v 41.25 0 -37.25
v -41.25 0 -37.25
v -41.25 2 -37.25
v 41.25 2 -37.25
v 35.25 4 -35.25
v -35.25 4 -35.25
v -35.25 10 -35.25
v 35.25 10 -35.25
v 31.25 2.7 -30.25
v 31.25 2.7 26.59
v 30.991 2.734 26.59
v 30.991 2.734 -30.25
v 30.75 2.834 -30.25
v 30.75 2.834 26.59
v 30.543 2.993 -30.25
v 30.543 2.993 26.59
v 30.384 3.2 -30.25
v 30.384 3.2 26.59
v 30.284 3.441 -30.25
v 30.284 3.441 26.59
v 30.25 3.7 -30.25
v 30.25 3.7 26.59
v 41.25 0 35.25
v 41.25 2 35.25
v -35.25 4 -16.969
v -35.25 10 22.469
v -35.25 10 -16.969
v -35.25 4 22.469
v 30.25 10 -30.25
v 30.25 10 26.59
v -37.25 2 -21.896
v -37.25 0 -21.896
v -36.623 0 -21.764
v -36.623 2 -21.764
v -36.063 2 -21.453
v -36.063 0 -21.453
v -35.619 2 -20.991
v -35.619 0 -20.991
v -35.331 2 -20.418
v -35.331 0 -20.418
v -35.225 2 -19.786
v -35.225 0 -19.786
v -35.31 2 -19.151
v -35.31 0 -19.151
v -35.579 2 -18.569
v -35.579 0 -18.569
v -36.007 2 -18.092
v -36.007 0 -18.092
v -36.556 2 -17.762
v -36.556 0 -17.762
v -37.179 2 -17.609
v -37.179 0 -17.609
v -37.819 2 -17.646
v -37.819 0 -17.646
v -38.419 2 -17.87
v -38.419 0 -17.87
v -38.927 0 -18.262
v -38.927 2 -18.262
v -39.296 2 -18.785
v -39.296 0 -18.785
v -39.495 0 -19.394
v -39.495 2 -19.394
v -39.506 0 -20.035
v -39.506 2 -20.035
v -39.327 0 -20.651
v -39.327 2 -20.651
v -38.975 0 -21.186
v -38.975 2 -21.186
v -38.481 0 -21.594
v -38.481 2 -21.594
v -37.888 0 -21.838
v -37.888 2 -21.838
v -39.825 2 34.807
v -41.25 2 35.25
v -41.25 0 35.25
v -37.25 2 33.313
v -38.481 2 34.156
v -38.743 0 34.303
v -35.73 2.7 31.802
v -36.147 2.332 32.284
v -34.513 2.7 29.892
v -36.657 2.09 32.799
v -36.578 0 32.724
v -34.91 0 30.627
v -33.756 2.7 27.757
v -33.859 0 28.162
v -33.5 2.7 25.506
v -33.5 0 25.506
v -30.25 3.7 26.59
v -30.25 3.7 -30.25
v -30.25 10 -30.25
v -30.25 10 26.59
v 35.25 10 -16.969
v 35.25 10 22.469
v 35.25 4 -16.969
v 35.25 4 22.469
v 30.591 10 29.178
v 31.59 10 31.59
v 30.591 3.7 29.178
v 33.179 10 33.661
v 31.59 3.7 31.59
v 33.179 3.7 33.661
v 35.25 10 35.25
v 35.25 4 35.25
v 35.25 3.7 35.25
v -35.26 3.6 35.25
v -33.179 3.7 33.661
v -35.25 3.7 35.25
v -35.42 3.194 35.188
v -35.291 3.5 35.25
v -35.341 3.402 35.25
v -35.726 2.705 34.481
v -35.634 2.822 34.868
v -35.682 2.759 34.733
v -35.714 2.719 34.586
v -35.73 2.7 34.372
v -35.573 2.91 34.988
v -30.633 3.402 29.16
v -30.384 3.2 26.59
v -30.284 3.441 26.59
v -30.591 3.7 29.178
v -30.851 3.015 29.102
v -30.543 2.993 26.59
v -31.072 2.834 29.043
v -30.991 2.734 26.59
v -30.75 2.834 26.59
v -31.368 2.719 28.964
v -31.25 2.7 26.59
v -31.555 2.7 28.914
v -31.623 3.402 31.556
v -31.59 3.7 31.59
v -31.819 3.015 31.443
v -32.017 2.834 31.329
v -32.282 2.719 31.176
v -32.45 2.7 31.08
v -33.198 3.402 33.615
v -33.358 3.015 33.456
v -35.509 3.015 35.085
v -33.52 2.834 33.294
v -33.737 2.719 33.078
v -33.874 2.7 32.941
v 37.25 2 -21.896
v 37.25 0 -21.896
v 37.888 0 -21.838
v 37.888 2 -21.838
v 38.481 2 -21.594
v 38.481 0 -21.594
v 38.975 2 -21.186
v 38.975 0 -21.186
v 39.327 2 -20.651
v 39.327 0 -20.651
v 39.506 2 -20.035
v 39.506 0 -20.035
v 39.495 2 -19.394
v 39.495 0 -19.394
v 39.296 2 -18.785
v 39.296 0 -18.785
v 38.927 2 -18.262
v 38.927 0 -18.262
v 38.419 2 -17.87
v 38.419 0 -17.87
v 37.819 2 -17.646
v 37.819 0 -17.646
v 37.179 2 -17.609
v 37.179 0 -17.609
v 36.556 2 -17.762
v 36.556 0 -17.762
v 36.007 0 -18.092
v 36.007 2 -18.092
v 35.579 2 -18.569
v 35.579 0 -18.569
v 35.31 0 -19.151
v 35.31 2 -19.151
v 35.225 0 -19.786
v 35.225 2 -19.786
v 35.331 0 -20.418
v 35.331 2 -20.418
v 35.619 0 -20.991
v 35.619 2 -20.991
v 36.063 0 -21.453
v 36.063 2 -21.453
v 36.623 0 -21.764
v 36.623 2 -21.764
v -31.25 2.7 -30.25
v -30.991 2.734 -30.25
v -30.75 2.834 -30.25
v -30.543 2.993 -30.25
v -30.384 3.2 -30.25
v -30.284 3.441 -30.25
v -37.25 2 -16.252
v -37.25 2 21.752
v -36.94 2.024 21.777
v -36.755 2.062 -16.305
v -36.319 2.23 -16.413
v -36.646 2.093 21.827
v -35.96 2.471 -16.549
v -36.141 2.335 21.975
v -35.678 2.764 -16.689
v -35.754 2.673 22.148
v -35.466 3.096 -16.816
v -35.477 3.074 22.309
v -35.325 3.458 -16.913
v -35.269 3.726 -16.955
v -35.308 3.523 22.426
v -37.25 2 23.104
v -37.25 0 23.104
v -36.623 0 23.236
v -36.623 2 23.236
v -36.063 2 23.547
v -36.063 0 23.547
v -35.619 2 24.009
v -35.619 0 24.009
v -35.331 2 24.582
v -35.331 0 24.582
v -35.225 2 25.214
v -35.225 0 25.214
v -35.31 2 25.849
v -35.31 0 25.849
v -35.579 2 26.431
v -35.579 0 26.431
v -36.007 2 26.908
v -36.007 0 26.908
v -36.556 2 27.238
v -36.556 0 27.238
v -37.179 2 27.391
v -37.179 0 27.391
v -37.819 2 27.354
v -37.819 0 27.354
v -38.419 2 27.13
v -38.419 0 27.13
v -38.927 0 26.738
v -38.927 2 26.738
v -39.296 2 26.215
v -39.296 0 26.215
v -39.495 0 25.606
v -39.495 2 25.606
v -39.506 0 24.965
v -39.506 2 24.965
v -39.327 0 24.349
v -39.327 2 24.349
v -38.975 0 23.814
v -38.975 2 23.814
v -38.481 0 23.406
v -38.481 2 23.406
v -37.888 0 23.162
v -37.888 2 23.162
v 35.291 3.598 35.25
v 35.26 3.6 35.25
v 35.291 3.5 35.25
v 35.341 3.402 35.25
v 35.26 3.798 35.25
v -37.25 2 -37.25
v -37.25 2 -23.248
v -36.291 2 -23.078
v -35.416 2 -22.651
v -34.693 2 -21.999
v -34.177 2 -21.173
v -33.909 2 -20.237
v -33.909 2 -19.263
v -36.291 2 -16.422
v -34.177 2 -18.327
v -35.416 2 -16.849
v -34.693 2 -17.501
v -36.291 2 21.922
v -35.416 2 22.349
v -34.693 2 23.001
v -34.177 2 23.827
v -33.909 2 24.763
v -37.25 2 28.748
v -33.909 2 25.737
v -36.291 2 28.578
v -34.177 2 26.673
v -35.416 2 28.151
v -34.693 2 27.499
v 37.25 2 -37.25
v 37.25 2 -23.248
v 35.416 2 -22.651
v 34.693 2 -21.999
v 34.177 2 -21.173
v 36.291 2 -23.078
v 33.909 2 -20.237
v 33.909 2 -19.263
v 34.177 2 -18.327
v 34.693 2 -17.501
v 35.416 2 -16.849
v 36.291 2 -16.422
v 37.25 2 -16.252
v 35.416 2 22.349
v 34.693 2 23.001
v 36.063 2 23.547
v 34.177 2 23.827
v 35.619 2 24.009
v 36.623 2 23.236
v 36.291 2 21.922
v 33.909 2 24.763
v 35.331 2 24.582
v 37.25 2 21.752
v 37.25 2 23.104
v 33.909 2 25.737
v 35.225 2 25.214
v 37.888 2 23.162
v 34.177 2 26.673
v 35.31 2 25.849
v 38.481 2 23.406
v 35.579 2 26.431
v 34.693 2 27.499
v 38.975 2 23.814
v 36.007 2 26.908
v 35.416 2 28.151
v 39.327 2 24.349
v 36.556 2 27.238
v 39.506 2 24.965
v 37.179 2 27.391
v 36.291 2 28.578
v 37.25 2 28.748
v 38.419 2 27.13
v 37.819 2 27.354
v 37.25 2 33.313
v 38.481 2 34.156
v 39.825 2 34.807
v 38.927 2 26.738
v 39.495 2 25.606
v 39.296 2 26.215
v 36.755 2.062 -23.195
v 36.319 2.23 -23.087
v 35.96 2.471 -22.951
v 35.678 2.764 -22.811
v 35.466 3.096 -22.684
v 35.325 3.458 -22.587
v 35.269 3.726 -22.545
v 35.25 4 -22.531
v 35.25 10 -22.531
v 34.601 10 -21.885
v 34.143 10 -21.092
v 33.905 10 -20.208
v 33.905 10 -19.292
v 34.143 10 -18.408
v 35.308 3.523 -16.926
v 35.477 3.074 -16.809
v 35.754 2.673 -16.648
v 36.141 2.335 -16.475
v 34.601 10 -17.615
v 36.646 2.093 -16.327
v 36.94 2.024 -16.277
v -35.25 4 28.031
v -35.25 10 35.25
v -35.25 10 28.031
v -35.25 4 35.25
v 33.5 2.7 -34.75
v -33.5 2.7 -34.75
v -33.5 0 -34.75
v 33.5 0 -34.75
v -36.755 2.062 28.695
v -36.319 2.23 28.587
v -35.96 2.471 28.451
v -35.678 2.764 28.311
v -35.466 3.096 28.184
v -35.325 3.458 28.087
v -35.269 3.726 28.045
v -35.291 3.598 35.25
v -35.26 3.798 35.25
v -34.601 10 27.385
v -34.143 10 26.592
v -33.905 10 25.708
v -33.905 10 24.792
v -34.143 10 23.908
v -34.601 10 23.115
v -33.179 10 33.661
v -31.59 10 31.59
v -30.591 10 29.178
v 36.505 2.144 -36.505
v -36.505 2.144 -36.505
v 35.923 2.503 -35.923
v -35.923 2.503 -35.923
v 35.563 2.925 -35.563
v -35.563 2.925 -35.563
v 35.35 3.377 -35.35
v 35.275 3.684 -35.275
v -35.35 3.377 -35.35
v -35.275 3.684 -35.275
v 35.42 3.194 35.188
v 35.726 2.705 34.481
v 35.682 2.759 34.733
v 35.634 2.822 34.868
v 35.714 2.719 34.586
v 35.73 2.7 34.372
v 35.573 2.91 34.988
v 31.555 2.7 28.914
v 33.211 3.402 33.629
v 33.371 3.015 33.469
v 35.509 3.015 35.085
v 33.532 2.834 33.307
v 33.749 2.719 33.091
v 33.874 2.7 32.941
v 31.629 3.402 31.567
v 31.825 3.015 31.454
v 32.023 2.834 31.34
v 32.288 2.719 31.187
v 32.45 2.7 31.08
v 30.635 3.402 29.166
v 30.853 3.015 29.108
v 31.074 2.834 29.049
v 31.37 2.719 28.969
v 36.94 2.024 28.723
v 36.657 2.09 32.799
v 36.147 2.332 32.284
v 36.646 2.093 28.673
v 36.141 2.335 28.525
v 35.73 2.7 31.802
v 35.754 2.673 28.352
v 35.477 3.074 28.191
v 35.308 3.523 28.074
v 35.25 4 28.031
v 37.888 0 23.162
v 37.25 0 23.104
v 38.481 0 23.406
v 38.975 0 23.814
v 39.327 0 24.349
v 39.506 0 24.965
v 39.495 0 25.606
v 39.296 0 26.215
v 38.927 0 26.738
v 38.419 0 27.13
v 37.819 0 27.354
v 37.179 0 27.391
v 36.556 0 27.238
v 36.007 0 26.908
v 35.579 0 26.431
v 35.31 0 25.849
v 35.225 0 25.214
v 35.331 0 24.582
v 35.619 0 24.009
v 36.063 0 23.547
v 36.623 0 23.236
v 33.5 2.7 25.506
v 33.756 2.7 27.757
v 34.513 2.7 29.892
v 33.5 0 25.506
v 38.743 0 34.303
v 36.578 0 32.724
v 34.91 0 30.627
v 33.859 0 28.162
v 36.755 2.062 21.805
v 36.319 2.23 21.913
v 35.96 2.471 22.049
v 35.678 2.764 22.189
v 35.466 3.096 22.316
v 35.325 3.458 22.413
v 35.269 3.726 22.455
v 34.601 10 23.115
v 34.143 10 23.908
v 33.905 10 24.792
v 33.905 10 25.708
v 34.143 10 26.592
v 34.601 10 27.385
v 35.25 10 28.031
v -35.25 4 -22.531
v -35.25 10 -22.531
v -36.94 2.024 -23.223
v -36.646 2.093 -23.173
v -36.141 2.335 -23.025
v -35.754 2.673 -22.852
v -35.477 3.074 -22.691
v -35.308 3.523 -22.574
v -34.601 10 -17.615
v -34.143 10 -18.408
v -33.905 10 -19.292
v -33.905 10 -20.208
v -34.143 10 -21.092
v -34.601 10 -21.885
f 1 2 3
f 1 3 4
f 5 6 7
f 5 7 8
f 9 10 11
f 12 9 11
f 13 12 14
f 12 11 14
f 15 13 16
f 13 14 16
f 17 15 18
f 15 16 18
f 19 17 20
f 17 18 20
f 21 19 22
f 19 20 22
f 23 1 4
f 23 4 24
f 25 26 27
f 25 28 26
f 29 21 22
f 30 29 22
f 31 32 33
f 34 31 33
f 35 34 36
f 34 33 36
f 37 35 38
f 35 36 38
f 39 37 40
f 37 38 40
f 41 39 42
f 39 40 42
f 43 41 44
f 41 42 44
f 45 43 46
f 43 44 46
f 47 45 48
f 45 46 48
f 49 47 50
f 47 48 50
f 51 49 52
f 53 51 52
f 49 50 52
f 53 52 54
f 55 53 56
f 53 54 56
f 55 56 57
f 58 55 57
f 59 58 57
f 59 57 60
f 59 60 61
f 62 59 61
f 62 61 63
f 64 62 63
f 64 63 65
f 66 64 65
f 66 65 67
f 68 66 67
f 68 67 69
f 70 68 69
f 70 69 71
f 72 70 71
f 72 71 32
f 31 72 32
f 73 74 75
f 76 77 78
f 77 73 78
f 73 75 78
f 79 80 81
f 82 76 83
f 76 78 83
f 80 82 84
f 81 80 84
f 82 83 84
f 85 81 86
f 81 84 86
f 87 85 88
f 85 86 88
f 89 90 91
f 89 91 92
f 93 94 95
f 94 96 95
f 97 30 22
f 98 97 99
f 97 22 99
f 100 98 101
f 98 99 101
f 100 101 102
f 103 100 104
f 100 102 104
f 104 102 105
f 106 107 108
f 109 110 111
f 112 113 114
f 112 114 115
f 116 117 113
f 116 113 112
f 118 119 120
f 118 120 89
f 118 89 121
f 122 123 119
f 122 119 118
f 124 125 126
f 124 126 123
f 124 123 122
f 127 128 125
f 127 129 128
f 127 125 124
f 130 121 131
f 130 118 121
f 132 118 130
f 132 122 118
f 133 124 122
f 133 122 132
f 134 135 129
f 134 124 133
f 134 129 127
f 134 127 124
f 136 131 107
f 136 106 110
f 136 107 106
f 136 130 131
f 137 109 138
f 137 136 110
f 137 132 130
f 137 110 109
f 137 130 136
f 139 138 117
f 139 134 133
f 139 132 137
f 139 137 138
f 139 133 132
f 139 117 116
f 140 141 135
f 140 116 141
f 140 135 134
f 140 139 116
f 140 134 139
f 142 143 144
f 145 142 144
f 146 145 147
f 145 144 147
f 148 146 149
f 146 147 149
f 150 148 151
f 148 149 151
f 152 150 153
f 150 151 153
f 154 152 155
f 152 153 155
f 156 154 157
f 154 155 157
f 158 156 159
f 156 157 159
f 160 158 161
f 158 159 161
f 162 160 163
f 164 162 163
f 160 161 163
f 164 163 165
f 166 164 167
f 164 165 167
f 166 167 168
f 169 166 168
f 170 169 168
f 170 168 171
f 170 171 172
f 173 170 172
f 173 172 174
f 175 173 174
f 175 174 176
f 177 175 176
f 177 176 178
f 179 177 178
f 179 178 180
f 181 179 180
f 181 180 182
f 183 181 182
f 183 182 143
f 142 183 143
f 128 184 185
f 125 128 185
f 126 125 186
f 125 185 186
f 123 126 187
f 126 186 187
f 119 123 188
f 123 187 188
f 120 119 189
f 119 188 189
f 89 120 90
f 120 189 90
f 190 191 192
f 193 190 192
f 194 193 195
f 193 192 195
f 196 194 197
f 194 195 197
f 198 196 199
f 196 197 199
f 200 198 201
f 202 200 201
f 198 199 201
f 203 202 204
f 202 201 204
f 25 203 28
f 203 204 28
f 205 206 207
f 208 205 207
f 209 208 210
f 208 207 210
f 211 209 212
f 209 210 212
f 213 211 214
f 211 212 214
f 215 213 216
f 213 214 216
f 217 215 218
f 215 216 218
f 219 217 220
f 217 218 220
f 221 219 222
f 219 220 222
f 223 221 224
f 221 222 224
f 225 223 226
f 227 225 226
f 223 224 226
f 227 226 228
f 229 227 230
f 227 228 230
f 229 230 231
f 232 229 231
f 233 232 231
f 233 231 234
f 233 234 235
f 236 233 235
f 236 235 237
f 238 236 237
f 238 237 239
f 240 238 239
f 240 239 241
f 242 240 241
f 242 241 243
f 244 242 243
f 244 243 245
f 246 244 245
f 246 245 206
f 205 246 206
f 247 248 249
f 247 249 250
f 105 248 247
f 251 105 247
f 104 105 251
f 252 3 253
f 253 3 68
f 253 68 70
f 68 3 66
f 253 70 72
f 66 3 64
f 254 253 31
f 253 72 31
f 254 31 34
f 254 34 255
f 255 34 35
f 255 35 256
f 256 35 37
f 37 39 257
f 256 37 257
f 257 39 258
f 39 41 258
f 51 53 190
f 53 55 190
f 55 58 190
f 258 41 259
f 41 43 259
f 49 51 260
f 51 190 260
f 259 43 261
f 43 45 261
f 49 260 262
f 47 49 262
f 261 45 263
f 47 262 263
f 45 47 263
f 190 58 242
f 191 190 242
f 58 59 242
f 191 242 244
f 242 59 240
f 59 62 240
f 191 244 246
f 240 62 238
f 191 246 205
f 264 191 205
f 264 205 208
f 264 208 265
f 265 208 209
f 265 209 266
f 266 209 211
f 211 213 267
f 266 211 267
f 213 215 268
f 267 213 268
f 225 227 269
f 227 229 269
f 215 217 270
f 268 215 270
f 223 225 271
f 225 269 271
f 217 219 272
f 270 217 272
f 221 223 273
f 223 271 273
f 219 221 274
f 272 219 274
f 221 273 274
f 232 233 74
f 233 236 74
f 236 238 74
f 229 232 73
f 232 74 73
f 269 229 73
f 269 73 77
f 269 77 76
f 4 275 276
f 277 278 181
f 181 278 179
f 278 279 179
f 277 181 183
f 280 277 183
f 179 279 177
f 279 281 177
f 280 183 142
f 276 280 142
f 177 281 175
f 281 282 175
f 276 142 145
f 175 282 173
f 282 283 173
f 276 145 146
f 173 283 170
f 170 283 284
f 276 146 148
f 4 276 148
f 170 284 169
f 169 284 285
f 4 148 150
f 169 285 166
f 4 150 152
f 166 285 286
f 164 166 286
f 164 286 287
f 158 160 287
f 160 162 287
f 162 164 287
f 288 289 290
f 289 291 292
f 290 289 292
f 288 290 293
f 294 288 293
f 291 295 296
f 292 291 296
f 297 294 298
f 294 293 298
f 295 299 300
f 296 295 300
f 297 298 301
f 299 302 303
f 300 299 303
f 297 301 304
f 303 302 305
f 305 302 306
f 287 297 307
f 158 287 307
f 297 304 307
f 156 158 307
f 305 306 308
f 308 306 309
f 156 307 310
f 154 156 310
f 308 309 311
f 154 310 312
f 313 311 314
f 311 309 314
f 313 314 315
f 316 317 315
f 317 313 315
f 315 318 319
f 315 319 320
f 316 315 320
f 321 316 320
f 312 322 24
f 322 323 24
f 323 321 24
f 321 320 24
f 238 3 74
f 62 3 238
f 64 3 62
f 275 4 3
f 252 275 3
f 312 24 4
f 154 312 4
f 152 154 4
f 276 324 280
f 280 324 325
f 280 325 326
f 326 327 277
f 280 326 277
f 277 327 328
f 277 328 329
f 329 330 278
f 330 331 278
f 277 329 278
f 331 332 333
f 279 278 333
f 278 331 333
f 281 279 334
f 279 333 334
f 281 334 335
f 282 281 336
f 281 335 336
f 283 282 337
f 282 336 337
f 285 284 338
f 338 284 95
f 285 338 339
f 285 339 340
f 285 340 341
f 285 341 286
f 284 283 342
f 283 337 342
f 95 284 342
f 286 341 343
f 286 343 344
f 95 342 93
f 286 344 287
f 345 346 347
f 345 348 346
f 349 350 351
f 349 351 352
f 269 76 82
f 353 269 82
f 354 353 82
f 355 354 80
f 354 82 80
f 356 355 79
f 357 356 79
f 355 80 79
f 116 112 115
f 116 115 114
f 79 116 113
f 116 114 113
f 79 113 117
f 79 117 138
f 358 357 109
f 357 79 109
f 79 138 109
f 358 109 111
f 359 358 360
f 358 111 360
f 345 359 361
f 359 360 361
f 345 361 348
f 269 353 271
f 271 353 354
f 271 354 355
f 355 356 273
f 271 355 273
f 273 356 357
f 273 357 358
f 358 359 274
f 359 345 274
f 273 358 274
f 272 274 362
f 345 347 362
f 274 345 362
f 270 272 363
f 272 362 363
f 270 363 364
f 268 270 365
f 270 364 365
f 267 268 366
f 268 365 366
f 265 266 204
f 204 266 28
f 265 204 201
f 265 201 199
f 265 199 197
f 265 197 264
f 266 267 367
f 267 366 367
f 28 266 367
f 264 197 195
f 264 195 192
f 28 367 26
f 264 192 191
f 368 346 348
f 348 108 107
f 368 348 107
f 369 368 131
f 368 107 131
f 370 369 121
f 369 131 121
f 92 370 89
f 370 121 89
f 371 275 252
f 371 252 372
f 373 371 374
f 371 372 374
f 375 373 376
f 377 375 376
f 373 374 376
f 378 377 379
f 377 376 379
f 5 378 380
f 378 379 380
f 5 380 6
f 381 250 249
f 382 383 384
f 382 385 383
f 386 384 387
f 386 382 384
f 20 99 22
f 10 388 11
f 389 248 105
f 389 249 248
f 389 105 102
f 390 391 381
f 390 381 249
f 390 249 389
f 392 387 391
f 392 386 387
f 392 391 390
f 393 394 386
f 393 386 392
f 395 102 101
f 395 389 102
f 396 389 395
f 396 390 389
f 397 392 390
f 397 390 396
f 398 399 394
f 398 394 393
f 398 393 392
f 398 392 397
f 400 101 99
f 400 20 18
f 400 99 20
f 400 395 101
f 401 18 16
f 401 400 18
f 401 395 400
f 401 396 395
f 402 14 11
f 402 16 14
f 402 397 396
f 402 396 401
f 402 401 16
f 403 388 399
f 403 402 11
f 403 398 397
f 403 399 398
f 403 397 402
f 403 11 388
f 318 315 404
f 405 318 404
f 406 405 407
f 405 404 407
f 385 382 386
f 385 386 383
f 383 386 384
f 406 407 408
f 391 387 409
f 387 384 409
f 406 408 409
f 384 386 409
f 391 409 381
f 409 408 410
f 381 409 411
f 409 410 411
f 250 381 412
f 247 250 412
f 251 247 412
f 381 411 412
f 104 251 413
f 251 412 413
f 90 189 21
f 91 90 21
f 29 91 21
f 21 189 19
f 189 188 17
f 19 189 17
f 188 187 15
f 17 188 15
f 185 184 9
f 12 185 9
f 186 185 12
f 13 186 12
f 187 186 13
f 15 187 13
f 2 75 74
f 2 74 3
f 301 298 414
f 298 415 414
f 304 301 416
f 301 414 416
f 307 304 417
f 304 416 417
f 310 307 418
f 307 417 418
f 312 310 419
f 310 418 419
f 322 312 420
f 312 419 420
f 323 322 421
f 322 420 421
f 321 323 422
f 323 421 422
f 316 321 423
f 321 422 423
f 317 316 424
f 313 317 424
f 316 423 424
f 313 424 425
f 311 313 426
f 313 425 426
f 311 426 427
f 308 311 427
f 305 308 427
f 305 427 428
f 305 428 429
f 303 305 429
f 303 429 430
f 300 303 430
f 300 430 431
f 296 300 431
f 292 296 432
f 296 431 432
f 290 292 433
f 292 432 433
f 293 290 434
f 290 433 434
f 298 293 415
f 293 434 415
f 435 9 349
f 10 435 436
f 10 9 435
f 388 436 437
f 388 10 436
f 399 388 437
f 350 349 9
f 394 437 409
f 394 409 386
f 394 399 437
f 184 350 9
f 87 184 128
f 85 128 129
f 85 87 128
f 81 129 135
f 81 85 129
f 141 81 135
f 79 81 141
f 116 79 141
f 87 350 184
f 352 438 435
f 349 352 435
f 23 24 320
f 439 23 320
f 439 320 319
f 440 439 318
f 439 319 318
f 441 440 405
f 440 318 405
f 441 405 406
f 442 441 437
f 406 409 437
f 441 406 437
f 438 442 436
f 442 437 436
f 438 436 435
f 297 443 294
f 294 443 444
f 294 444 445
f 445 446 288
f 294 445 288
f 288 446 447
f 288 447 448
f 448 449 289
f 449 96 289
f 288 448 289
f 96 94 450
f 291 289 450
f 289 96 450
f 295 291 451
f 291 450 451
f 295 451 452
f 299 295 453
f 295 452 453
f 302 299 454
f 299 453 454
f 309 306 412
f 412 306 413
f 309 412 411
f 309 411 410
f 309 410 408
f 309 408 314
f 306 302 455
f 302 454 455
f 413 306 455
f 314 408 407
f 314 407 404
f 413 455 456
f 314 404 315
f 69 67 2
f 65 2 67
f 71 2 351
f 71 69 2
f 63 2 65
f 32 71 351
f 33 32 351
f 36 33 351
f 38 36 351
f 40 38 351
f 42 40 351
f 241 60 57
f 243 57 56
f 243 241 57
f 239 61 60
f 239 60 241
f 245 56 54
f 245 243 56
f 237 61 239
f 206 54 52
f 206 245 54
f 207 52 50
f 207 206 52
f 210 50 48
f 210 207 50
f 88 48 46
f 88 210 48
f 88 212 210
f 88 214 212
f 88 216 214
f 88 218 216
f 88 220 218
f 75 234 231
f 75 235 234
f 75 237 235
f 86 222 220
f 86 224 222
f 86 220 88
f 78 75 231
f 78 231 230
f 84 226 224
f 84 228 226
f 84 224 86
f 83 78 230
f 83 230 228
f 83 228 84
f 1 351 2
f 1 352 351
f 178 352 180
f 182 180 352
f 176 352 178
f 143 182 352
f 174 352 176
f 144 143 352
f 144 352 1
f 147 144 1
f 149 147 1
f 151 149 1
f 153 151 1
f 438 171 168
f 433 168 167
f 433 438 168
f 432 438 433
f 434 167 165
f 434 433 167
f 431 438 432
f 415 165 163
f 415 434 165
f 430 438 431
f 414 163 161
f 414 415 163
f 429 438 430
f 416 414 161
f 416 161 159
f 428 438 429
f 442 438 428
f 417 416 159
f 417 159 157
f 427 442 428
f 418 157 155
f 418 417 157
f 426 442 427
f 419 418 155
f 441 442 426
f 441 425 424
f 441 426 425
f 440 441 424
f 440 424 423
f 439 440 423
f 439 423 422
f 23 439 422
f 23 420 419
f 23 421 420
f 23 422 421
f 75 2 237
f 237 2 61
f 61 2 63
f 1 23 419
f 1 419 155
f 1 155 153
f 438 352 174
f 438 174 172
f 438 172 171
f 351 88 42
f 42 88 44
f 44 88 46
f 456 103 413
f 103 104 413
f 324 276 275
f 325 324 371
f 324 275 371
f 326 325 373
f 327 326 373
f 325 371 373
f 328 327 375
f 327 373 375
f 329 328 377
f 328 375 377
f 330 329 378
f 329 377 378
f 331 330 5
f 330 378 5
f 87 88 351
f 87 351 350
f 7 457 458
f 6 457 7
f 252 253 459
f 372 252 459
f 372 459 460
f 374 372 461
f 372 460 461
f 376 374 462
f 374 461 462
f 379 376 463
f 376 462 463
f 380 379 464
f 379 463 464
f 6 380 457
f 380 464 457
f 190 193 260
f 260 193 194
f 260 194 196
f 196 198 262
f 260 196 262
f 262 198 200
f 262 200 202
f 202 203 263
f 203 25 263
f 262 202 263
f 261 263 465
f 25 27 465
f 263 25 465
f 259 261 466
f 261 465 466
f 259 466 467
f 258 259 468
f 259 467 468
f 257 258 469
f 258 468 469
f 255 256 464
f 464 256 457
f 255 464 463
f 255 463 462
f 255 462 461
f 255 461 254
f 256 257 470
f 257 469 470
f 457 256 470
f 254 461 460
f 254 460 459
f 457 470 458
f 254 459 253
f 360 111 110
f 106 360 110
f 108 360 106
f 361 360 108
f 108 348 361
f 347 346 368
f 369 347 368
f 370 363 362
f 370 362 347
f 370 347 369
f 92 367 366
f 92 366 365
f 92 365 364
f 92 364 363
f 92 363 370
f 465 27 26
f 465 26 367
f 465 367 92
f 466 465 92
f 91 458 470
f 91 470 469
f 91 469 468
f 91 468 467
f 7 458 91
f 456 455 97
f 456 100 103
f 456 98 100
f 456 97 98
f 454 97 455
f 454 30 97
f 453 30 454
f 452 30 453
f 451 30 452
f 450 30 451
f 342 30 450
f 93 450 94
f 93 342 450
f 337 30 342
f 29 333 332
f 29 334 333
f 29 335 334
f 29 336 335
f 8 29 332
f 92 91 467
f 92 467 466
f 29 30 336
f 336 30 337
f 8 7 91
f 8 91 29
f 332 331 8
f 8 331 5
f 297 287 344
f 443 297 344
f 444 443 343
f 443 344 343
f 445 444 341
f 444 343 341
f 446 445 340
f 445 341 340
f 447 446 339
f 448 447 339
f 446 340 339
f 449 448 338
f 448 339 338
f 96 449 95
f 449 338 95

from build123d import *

# Parameters (mm, degrees)
SKETCH1_W           = 70.5
SKETCH1_H           = 70.5
SKETCH1_W_2         = 60.5
SKETCH1_H_2         = 60.5
BOSS_EXTRUDE1_DEPTH = 10
SKETCH2_W           = 67
SKETCH2_H           = 5.4
CUT_EXTRUDE1_DEPTH  = 70
BOSS_EXTRUDE3_DEPTH = 2
SKETCH7_W           = 60.5
SKETCH7_H           = 5
CUT_EXTRUDE3_DEPTH  = 25
FILLET2_R           = 2
SKETCH8_W           = 97.382964501
SKETCH8_H           = 35.083557697
CUT_EXTRUDE4_DEPTH  = 2
SKETCH9_R           = 2.15
CUT_EXTRUDE5_DEPTH  = 5
SKETCH10_R          = 3.5
CUT_EXTRUDE6_DEPTH  = 8
FILLET3_R           = 10
FILLET4_R           = 10
FILLET5_R           = 1


# Some blends are built 0.0001 mm under size
with BuildPart() as part:
    # Sketch1 → Boss-Extrude1 (new body)
    with BuildSketch(Plane(origin=(0, 0, 0), x_dir=(1, 0, 0), z_dir=(0, 1, 0))):
        Rectangle(SKETCH1_W, SKETCH1_H)
        Rectangle(SKETCH1_W_2, SKETCH1_H_2, mode=Mode.SUBTRACT)
    extrude(amount=BOSS_EXTRUDE1_DEPTH)

    # Sketch2 → Cut-Extrude1 (cut)
    with BuildSketch(Plane.XY.offset(35.25)):
        Rectangle(SKETCH2_W, SKETCH2_H)
    extrude(amount=-CUT_EXTRUDE1_DEPTH, mode=Mode.SUBTRACT)

    # Sketch6 → Boss-Extrude3 (add)
    with BuildSketch(Plane.XZ):
        Polygon((41.25, -37.25), (41.25, 37.25), (35.25, 37.25), (35.25, 35.25), (35.25, -35.25), (-35.25, -35.25), (-35.25, 35.25), (-35.25, 37.25), (-41.25, 37.25), (-41.25, -37.25), align=None)
    extrude(amount=-BOSS_EXTRUDE3_DEPTH)

    # Sketch7 → Cut-Extrude3 (cut)
    with BuildSketch(Plane.XZ.offset(-2.7)):
        with Locations((0, 32.75)):
            Rectangle(SKETCH7_W, SKETCH7_H)
    extrude(amount=-CUT_EXTRUDE3_DEPTH, mode=Mode.SUBTRACT)

    # Fillet2
    fillet2_edges = [part.edges().sort_by_distance(p)[0] for p in [
        (35.25, 2, 0),
        (-35.25, 2, 0),
        (0, 2, -35.25),
    ]]
    fillet(fillet2_edges, radius=FILLET2_R - 0.0001)  # a hair under: the kernel refuses the full size

    # Sketch8 → Cut-Extrude4 (cut)
    with BuildSketch(Plane.XY.offset(37.25)):
        with Locations((-5.820498703, 2.430952297)):
            Rectangle(SKETCH8_W, SKETCH8_H)
    extrude(amount=-CUT_EXTRUDE4_DEPTH, mode=Mode.SUBTRACT)

    # Sketch9 → Cut-Extrude5 (cut, symmetric)
    with BuildSketch(Plane.XZ):
        with Locations(Location((-37.375, 25.25, 0), (0, 0, 273.333029494))):
            Circle(SKETCH9_R)
        with Locations(Location((-37.375, -19.75, 0), (0, 0, 273.333029494))):
            Circle(SKETCH9_R)
        with Locations(Location((37.375, -19.75, 0), (0, 0, 266.666970506))):
            Circle(SKETCH9_R)
        with Locations(Location((37.375, 25.25, 0), (0, 0, 266.666970506))):
            Circle(SKETCH9_R)
    extrude(amount=CUT_EXTRUDE5_DEPTH, both=True, mode=Mode.SUBTRACT)

    # Sketch10 → Cut-Extrude6 (cut)
    with BuildSketch(Plane(origin=(0, 10, 0), x_dir=(1, 0, 0), z_dir=(0, 1, 0))):
        with Locations((-37.375, 19.75)):
            Circle(SKETCH10_R)
        with Locations((-37.375, -25.25)):
            Circle(SKETCH10_R)
        with Locations((37.375, -25.25)):
            Circle(SKETCH10_R)
        with Locations((37.375, 19.75)):
            Circle(SKETCH10_R)
    extrude(amount=-CUT_EXTRUDE6_DEPTH, mode=Mode.SUBTRACT)

    # Fillet3
    # the kernel refuses this fillet: 10 mm, written as the material it takes off along each edge
    with BuildSketch(Plane(origin=(-33.5, -24.358969087, 35.25), x_dir=(0, 0, -1), z_dir=(0, 1, 0)), Plane(origin=(33.5, 2.7, 35.25), x_dir=(0, 0, -1), z_dir=(0, -1, 0))) as fillet3_piece_1:
        with BuildLine():
            CenterArc((9.743587635, 10), FILLET3_R, 193.002878163, 76.997121837)
            Line((0, 7.75), (0, 0))
            Line((0, 0), (9.743587635, 0))
        make_face()
    extrude(amount=27.058969087, mode=Mode.SUBTRACT)

    # Fillet4
    # the kernel refuses this fillet: 10 mm, written as the material it takes off along each edge
    with BuildSketch(Plane(origin=(30.25, -18.950635095, 35.25), x_dir=(0, 0, -1), z_dir=(0, 1, 0))) as fillet4_piece_1:
        with BuildLine():
            CenterArc((8.660254038, -10), FILLET4_R, 90, 60)
            Line((0, -5), (-0.173205081, -4.9))
            ThreePointArc((-0.173205081, -4.9), (-0.2, -2.5), (-0.2, 0))
            Line((-0.2, 0), (0, 0.2))
            Line((0, 0.2), (8.660254038, 0.2))
            Line((8.660254038, 0.2), (8.660254038, 0))
        make_face()
    extrude(amount=50.601270189, mode=Mode.SUBTRACT)
    with BuildSketch(Plane(origin=(-30.25, -18.950635095, 35.25), x_dir=(0, 0, -1), z_dir=(0, 1, 0))) as fillet4_piece_2:
        with BuildLine():
            CenterArc((8.660254038, 10), FILLET4_R, 210, 60)
            Line((0, 5), (-0.173205081, 4.9))
            ThreePointArc((-0.173205081, 4.9), (-0.2, 2.5), (-0.2, 0))
            Line((-0.2, 0), (0, -0.2))
            Line((0, -0.2), (8.660254038, -0.2))
            Line((8.660254038, -0.2), (8.660254038, 0))
        make_face()
    extrude(amount=50.601270189, mode=Mode.SUBTRACT)

    # Fillet5
    # the kernel refuses this fillet: 1 mm, written as the material it takes off along each edge
    with BuildSketch(Plane(origin=(30.25, 2.7, 26.589745962), x_dir=(1, 0, 0), z_dir=(0, 0, -1)), Plane(origin=(-30.25, 2.7, -30.25), x_dir=(-1, 0, 0), z_dir=(0, 0, 1))) as fillet5_piece_1:
        with BuildLine():
            CenterArc((FILLET5_R, -FILLET5_R), FILLET5_R, 90, 90)
            Line((0, -FILLET5_R), (0, 0))
            Line((0, 0), (FILLET5_R, 0))
        make_face()
    extrude(amount=56.839745962, mode=Mode.SUBTRACT)
    with BuildSketch(Plane(origin=(40.25, 2.7, 26.589745962), x_dir=(-0.27015512952929444, 0, 0.9628168081151316), z_dir=(0.9628168081151316, 0, 0.27015512952929444))) as fillet5_piece_2:
        with BuildLine():
            CenterArc((10 - FILLET5_R, -FILLET5_R), FILLET5_R, 0, 90)
            Line((10 - FILLET5_R, 0), (10, 0))
            Line((10, 0), (10, -FILLET5_R))
        make_face()
    revolve(axis=Axis((40.25, 2.7, 26.589745962), (0, -1, 0)), revolution_arc=74.326501832, mode=Mode.SUBTRACT)
    with BuildSketch(Plane(origin=(-40.25, 2.7, 26.589745962), x_dir=(1, 0, 0), z_dir=(0, 0, -1))) as fillet5_piece_3:
        with BuildLine():
            CenterArc((10 - FILLET5_R, -FILLET5_R), FILLET5_R, 0, 90)
            Line((10, -FILLET5_R), (10, 0))
            Line((10, 0), (10 - FILLET5_R, 0))
        make_face()
    revolve(axis=Axis((-40.25, 2.7, 26.589745962), (0, -1, 0)), revolution_arc=74.326501832, mode=Mode.SUBTRACT)


solid = part.part
